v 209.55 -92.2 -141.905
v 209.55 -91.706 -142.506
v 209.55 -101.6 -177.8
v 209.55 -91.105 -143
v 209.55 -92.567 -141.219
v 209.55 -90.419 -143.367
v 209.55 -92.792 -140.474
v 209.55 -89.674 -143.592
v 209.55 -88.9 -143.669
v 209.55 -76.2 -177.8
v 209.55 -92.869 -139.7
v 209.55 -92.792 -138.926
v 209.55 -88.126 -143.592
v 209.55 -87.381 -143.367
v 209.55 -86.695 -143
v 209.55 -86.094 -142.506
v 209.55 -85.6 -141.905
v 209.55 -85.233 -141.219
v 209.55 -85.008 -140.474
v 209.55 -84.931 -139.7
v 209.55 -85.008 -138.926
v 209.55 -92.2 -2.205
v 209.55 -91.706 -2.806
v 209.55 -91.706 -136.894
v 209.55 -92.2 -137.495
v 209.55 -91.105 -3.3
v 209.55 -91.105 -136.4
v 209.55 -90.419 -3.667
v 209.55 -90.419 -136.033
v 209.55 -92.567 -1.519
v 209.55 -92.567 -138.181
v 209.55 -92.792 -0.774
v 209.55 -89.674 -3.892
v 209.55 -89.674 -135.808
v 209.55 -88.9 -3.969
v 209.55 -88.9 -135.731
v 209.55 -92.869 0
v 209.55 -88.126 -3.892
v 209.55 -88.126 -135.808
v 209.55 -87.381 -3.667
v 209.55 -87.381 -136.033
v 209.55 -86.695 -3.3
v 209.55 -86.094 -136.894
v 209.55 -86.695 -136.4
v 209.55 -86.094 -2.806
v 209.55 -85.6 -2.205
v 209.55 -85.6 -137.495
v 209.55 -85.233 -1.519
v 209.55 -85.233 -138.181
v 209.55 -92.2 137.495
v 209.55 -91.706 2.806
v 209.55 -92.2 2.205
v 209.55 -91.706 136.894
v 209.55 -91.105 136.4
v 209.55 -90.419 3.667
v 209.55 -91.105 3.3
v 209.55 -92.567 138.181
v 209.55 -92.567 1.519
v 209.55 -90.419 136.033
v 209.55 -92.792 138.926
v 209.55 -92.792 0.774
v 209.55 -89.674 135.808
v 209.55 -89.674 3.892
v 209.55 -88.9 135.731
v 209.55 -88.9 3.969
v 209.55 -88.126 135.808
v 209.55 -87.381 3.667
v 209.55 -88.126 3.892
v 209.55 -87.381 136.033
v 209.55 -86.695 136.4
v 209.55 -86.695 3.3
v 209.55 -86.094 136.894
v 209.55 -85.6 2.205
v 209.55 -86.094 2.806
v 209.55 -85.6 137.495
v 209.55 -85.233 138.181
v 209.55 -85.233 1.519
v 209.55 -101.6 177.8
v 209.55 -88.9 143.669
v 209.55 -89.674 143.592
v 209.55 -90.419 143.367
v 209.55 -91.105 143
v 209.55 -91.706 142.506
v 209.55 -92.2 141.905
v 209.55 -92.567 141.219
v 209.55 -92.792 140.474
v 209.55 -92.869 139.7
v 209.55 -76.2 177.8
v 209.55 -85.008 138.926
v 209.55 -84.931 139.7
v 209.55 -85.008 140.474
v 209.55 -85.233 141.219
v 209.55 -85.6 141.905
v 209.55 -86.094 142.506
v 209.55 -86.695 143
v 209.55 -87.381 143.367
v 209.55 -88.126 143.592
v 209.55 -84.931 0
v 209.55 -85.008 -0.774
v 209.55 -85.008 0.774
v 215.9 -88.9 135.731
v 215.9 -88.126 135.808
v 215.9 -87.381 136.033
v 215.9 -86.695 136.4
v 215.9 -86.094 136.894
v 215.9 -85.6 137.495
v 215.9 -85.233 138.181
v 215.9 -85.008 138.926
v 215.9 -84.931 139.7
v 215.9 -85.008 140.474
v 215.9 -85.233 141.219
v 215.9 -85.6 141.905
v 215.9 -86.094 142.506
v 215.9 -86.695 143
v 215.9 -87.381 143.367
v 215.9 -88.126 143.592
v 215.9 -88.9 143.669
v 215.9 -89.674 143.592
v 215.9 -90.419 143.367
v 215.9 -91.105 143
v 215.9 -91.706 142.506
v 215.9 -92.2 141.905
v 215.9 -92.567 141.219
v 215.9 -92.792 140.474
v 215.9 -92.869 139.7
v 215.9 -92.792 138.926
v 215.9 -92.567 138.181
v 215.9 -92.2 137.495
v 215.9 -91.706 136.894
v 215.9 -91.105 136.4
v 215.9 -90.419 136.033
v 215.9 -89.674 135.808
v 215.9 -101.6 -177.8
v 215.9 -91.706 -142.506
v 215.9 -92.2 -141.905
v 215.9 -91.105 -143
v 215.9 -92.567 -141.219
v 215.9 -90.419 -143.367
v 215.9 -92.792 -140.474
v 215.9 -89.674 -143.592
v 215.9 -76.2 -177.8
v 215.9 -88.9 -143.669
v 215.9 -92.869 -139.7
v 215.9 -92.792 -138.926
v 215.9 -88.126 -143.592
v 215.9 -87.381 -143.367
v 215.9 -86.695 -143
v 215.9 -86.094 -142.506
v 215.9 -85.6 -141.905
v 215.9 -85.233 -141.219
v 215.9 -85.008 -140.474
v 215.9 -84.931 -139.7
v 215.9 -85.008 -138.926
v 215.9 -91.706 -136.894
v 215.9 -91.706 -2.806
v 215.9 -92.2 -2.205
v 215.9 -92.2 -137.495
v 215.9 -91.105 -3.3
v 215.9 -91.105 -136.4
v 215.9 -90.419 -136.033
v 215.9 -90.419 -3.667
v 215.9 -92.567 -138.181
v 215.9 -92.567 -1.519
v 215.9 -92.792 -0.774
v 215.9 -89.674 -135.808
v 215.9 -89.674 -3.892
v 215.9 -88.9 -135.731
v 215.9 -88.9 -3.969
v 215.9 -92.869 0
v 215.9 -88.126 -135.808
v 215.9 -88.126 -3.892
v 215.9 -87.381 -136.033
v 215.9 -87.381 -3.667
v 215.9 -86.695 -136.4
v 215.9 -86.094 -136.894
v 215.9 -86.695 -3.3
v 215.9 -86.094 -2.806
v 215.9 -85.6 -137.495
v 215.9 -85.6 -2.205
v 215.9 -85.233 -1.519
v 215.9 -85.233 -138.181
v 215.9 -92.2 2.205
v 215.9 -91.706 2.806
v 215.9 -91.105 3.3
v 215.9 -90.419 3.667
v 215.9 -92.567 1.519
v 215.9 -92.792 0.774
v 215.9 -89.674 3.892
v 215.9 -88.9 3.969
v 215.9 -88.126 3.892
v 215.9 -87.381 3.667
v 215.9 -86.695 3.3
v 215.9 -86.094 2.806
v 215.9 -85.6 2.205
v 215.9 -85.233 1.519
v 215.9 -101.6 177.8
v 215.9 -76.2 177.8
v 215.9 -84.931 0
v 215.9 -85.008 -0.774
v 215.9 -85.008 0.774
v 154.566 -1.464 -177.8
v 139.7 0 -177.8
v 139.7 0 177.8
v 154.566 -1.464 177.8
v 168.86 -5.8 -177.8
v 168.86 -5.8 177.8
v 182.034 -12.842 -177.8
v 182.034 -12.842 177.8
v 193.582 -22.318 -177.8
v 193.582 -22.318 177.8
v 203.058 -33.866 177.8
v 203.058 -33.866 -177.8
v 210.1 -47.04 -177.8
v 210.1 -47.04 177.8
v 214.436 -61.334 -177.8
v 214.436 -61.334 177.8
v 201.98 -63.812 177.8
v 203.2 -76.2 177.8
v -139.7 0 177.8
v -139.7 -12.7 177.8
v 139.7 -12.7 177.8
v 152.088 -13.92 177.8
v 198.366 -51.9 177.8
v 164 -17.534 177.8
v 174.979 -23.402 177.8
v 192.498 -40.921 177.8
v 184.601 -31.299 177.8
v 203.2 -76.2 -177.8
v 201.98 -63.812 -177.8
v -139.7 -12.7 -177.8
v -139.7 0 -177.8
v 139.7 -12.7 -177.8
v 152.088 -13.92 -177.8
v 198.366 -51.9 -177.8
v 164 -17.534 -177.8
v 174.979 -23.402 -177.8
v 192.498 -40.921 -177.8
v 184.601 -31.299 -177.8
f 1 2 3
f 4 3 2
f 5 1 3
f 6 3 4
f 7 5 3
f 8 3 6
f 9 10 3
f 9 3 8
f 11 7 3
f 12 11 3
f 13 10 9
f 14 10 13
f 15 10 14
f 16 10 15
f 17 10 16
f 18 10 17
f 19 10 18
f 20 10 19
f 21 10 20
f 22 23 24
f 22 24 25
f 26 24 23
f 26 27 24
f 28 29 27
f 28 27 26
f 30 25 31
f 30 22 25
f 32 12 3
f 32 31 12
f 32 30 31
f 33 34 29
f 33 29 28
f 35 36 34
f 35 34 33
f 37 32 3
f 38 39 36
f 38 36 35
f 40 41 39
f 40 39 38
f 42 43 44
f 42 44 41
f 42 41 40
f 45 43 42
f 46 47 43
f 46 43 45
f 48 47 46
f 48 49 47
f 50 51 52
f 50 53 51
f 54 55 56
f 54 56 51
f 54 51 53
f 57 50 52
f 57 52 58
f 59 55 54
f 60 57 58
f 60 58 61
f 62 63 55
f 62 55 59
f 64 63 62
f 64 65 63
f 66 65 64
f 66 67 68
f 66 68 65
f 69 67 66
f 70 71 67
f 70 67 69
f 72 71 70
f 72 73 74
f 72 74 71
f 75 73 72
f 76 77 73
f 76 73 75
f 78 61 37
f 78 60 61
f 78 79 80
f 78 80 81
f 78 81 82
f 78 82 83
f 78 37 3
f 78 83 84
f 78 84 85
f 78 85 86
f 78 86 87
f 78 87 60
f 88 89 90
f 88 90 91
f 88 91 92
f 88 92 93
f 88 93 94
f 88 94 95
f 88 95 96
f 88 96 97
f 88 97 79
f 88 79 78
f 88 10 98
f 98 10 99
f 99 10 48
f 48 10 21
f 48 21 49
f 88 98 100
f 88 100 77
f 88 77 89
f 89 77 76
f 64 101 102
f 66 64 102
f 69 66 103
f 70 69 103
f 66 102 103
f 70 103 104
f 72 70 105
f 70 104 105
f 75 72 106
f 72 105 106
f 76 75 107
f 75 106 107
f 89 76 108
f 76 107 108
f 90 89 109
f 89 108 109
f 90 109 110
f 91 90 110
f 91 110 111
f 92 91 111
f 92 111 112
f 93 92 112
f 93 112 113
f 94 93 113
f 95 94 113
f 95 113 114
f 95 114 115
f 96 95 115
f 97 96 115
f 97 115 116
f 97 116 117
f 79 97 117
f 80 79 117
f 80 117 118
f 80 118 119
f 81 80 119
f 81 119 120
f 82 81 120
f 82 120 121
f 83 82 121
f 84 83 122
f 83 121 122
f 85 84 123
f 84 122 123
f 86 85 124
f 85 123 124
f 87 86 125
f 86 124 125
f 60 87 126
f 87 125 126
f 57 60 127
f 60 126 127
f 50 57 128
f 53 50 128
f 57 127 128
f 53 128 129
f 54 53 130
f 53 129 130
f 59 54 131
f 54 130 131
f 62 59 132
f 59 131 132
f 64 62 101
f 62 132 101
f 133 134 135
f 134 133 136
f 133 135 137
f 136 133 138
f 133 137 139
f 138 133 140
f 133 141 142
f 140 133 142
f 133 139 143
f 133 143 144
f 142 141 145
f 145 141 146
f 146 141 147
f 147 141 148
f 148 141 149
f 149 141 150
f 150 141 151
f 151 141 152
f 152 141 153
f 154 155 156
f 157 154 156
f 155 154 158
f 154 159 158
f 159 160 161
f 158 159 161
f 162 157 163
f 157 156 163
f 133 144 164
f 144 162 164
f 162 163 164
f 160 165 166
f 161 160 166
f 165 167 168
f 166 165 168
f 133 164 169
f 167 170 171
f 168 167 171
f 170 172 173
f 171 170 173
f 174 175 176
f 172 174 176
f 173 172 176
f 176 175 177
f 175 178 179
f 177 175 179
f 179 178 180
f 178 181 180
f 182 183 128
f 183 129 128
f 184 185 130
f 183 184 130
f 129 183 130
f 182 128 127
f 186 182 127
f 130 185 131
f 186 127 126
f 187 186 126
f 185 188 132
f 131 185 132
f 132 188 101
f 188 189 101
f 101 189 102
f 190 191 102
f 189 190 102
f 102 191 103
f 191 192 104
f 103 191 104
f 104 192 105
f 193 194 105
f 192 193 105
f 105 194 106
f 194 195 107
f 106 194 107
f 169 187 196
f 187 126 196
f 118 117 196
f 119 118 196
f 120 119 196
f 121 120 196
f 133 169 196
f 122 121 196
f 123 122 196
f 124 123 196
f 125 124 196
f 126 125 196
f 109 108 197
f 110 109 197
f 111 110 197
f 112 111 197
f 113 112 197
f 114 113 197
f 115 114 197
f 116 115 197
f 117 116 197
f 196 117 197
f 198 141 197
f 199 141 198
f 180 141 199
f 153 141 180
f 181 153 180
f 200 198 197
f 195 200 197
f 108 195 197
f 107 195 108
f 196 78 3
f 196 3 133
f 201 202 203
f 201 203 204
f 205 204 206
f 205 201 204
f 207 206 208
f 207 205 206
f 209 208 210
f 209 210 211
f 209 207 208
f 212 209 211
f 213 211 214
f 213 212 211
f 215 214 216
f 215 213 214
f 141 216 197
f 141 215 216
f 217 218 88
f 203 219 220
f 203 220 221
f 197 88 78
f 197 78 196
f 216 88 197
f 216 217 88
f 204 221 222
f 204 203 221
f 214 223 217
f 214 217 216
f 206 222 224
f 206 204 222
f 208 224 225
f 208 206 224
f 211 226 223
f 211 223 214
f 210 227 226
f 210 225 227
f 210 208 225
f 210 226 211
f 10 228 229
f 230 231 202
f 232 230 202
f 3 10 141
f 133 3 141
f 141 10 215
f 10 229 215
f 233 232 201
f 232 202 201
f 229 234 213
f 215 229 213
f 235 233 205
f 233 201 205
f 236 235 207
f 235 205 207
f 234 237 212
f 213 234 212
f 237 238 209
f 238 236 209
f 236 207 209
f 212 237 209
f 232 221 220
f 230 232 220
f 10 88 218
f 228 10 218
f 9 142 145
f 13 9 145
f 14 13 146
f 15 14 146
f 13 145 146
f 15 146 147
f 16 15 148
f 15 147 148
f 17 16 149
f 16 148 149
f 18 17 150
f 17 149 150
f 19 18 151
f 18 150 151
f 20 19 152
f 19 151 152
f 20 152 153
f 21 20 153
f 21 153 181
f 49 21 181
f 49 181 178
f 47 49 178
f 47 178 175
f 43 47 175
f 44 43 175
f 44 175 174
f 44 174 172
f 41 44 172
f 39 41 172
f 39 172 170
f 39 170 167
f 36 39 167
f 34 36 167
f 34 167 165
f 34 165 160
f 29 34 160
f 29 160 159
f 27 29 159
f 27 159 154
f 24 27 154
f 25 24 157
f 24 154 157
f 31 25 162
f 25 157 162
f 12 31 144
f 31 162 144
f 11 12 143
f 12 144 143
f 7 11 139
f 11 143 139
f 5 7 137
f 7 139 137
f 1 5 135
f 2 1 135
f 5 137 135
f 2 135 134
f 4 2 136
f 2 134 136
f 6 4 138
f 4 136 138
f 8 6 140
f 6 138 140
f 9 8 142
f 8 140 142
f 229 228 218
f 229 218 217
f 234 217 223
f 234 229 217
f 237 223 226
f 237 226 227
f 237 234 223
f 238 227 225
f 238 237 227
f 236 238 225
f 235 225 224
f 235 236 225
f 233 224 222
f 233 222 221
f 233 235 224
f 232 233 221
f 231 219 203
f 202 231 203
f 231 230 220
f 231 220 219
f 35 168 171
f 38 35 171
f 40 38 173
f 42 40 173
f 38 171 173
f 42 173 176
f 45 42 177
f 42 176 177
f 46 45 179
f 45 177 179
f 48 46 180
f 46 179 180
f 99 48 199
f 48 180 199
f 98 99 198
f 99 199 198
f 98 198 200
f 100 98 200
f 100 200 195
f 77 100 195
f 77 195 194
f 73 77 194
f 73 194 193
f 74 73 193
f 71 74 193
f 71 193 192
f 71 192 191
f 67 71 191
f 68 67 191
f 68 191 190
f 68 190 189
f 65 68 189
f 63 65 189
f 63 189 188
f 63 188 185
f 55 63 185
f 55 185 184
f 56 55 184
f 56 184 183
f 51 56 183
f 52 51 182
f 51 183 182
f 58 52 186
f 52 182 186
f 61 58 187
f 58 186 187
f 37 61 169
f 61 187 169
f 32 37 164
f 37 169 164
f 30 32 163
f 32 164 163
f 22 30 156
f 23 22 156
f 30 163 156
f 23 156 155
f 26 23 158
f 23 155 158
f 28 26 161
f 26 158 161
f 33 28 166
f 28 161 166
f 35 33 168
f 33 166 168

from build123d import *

# Parameters (mm, degrees)
BOSS_EXTRUDE1_DEPTH      = 177.8
BOSS_EXTRUDE1_DEPTH_BACK = 177.8
SKETCH2_W                = 6.35
SKETCH2_H                = 355.6
BOSS_EXTRUDE2_DEPTH      = 25.4
SKETCH3_R                = 3.96875
CUT_EXTRUDE1_DEPTH       = 25.4


with BuildPart() as part:
    # Sketch1 → Boss-Extrude1 (new, two sides: drawn at the far end of the back side and taken through both)
    with BuildSketch(Plane.XY.offset(-BOSS_EXTRUDE1_DEPTH_BACK)):
        with BuildLine():
            Line((-139.7, 0), (139.7, 0))
            ThreePointArc((139.7, 0), (193.581536726, -22.318463274), (215.9, -76.2))
            Line((215.9, -76.2), (203.2, -76.2))
            ThreePointArc((203.2, -76.2), (184.601280605, -31.298719395), (139.7, -12.7))
            Line((139.7, -12.7), (-139.7, -12.7))
            Line((-139.7, -12.7), (-139.7, 0))
        make_face()
    extrude(amount=BOSS_EXTRUDE1_DEPTH + BOSS_EXTRUDE1_DEPTH_BACK)

    # Sketch2 → Boss-Extrude2 (add)
    with BuildSketch(Plane.XZ.offset(76.2)):
        with Locations((212.725, 0)):
            Rectangle(SKETCH2_W, SKETCH2_H)
    extrude(amount=BOSS_EXTRUDE2_DEPTH)

    # Sketch3 → Cut-Extrude1 (cut)
    with BuildSketch(Plane(origin=(215.9, 0, 0), x_dir=(0, 0, -1), z_dir=(1, 0, 0))):
        with Locations((-139.7, -88.9)):
            Circle(SKETCH3_R)
        with Locations((0, -88.9)):
            Circle(SKETCH3_R)
        with Locations((139.7, -88.9)):
            Circle(SKETCH3_R)
    extrude(amount=-CUT_EXTRUDE1_DEPTH, mode=Mode.SUBTRACT)


solid = part.part
